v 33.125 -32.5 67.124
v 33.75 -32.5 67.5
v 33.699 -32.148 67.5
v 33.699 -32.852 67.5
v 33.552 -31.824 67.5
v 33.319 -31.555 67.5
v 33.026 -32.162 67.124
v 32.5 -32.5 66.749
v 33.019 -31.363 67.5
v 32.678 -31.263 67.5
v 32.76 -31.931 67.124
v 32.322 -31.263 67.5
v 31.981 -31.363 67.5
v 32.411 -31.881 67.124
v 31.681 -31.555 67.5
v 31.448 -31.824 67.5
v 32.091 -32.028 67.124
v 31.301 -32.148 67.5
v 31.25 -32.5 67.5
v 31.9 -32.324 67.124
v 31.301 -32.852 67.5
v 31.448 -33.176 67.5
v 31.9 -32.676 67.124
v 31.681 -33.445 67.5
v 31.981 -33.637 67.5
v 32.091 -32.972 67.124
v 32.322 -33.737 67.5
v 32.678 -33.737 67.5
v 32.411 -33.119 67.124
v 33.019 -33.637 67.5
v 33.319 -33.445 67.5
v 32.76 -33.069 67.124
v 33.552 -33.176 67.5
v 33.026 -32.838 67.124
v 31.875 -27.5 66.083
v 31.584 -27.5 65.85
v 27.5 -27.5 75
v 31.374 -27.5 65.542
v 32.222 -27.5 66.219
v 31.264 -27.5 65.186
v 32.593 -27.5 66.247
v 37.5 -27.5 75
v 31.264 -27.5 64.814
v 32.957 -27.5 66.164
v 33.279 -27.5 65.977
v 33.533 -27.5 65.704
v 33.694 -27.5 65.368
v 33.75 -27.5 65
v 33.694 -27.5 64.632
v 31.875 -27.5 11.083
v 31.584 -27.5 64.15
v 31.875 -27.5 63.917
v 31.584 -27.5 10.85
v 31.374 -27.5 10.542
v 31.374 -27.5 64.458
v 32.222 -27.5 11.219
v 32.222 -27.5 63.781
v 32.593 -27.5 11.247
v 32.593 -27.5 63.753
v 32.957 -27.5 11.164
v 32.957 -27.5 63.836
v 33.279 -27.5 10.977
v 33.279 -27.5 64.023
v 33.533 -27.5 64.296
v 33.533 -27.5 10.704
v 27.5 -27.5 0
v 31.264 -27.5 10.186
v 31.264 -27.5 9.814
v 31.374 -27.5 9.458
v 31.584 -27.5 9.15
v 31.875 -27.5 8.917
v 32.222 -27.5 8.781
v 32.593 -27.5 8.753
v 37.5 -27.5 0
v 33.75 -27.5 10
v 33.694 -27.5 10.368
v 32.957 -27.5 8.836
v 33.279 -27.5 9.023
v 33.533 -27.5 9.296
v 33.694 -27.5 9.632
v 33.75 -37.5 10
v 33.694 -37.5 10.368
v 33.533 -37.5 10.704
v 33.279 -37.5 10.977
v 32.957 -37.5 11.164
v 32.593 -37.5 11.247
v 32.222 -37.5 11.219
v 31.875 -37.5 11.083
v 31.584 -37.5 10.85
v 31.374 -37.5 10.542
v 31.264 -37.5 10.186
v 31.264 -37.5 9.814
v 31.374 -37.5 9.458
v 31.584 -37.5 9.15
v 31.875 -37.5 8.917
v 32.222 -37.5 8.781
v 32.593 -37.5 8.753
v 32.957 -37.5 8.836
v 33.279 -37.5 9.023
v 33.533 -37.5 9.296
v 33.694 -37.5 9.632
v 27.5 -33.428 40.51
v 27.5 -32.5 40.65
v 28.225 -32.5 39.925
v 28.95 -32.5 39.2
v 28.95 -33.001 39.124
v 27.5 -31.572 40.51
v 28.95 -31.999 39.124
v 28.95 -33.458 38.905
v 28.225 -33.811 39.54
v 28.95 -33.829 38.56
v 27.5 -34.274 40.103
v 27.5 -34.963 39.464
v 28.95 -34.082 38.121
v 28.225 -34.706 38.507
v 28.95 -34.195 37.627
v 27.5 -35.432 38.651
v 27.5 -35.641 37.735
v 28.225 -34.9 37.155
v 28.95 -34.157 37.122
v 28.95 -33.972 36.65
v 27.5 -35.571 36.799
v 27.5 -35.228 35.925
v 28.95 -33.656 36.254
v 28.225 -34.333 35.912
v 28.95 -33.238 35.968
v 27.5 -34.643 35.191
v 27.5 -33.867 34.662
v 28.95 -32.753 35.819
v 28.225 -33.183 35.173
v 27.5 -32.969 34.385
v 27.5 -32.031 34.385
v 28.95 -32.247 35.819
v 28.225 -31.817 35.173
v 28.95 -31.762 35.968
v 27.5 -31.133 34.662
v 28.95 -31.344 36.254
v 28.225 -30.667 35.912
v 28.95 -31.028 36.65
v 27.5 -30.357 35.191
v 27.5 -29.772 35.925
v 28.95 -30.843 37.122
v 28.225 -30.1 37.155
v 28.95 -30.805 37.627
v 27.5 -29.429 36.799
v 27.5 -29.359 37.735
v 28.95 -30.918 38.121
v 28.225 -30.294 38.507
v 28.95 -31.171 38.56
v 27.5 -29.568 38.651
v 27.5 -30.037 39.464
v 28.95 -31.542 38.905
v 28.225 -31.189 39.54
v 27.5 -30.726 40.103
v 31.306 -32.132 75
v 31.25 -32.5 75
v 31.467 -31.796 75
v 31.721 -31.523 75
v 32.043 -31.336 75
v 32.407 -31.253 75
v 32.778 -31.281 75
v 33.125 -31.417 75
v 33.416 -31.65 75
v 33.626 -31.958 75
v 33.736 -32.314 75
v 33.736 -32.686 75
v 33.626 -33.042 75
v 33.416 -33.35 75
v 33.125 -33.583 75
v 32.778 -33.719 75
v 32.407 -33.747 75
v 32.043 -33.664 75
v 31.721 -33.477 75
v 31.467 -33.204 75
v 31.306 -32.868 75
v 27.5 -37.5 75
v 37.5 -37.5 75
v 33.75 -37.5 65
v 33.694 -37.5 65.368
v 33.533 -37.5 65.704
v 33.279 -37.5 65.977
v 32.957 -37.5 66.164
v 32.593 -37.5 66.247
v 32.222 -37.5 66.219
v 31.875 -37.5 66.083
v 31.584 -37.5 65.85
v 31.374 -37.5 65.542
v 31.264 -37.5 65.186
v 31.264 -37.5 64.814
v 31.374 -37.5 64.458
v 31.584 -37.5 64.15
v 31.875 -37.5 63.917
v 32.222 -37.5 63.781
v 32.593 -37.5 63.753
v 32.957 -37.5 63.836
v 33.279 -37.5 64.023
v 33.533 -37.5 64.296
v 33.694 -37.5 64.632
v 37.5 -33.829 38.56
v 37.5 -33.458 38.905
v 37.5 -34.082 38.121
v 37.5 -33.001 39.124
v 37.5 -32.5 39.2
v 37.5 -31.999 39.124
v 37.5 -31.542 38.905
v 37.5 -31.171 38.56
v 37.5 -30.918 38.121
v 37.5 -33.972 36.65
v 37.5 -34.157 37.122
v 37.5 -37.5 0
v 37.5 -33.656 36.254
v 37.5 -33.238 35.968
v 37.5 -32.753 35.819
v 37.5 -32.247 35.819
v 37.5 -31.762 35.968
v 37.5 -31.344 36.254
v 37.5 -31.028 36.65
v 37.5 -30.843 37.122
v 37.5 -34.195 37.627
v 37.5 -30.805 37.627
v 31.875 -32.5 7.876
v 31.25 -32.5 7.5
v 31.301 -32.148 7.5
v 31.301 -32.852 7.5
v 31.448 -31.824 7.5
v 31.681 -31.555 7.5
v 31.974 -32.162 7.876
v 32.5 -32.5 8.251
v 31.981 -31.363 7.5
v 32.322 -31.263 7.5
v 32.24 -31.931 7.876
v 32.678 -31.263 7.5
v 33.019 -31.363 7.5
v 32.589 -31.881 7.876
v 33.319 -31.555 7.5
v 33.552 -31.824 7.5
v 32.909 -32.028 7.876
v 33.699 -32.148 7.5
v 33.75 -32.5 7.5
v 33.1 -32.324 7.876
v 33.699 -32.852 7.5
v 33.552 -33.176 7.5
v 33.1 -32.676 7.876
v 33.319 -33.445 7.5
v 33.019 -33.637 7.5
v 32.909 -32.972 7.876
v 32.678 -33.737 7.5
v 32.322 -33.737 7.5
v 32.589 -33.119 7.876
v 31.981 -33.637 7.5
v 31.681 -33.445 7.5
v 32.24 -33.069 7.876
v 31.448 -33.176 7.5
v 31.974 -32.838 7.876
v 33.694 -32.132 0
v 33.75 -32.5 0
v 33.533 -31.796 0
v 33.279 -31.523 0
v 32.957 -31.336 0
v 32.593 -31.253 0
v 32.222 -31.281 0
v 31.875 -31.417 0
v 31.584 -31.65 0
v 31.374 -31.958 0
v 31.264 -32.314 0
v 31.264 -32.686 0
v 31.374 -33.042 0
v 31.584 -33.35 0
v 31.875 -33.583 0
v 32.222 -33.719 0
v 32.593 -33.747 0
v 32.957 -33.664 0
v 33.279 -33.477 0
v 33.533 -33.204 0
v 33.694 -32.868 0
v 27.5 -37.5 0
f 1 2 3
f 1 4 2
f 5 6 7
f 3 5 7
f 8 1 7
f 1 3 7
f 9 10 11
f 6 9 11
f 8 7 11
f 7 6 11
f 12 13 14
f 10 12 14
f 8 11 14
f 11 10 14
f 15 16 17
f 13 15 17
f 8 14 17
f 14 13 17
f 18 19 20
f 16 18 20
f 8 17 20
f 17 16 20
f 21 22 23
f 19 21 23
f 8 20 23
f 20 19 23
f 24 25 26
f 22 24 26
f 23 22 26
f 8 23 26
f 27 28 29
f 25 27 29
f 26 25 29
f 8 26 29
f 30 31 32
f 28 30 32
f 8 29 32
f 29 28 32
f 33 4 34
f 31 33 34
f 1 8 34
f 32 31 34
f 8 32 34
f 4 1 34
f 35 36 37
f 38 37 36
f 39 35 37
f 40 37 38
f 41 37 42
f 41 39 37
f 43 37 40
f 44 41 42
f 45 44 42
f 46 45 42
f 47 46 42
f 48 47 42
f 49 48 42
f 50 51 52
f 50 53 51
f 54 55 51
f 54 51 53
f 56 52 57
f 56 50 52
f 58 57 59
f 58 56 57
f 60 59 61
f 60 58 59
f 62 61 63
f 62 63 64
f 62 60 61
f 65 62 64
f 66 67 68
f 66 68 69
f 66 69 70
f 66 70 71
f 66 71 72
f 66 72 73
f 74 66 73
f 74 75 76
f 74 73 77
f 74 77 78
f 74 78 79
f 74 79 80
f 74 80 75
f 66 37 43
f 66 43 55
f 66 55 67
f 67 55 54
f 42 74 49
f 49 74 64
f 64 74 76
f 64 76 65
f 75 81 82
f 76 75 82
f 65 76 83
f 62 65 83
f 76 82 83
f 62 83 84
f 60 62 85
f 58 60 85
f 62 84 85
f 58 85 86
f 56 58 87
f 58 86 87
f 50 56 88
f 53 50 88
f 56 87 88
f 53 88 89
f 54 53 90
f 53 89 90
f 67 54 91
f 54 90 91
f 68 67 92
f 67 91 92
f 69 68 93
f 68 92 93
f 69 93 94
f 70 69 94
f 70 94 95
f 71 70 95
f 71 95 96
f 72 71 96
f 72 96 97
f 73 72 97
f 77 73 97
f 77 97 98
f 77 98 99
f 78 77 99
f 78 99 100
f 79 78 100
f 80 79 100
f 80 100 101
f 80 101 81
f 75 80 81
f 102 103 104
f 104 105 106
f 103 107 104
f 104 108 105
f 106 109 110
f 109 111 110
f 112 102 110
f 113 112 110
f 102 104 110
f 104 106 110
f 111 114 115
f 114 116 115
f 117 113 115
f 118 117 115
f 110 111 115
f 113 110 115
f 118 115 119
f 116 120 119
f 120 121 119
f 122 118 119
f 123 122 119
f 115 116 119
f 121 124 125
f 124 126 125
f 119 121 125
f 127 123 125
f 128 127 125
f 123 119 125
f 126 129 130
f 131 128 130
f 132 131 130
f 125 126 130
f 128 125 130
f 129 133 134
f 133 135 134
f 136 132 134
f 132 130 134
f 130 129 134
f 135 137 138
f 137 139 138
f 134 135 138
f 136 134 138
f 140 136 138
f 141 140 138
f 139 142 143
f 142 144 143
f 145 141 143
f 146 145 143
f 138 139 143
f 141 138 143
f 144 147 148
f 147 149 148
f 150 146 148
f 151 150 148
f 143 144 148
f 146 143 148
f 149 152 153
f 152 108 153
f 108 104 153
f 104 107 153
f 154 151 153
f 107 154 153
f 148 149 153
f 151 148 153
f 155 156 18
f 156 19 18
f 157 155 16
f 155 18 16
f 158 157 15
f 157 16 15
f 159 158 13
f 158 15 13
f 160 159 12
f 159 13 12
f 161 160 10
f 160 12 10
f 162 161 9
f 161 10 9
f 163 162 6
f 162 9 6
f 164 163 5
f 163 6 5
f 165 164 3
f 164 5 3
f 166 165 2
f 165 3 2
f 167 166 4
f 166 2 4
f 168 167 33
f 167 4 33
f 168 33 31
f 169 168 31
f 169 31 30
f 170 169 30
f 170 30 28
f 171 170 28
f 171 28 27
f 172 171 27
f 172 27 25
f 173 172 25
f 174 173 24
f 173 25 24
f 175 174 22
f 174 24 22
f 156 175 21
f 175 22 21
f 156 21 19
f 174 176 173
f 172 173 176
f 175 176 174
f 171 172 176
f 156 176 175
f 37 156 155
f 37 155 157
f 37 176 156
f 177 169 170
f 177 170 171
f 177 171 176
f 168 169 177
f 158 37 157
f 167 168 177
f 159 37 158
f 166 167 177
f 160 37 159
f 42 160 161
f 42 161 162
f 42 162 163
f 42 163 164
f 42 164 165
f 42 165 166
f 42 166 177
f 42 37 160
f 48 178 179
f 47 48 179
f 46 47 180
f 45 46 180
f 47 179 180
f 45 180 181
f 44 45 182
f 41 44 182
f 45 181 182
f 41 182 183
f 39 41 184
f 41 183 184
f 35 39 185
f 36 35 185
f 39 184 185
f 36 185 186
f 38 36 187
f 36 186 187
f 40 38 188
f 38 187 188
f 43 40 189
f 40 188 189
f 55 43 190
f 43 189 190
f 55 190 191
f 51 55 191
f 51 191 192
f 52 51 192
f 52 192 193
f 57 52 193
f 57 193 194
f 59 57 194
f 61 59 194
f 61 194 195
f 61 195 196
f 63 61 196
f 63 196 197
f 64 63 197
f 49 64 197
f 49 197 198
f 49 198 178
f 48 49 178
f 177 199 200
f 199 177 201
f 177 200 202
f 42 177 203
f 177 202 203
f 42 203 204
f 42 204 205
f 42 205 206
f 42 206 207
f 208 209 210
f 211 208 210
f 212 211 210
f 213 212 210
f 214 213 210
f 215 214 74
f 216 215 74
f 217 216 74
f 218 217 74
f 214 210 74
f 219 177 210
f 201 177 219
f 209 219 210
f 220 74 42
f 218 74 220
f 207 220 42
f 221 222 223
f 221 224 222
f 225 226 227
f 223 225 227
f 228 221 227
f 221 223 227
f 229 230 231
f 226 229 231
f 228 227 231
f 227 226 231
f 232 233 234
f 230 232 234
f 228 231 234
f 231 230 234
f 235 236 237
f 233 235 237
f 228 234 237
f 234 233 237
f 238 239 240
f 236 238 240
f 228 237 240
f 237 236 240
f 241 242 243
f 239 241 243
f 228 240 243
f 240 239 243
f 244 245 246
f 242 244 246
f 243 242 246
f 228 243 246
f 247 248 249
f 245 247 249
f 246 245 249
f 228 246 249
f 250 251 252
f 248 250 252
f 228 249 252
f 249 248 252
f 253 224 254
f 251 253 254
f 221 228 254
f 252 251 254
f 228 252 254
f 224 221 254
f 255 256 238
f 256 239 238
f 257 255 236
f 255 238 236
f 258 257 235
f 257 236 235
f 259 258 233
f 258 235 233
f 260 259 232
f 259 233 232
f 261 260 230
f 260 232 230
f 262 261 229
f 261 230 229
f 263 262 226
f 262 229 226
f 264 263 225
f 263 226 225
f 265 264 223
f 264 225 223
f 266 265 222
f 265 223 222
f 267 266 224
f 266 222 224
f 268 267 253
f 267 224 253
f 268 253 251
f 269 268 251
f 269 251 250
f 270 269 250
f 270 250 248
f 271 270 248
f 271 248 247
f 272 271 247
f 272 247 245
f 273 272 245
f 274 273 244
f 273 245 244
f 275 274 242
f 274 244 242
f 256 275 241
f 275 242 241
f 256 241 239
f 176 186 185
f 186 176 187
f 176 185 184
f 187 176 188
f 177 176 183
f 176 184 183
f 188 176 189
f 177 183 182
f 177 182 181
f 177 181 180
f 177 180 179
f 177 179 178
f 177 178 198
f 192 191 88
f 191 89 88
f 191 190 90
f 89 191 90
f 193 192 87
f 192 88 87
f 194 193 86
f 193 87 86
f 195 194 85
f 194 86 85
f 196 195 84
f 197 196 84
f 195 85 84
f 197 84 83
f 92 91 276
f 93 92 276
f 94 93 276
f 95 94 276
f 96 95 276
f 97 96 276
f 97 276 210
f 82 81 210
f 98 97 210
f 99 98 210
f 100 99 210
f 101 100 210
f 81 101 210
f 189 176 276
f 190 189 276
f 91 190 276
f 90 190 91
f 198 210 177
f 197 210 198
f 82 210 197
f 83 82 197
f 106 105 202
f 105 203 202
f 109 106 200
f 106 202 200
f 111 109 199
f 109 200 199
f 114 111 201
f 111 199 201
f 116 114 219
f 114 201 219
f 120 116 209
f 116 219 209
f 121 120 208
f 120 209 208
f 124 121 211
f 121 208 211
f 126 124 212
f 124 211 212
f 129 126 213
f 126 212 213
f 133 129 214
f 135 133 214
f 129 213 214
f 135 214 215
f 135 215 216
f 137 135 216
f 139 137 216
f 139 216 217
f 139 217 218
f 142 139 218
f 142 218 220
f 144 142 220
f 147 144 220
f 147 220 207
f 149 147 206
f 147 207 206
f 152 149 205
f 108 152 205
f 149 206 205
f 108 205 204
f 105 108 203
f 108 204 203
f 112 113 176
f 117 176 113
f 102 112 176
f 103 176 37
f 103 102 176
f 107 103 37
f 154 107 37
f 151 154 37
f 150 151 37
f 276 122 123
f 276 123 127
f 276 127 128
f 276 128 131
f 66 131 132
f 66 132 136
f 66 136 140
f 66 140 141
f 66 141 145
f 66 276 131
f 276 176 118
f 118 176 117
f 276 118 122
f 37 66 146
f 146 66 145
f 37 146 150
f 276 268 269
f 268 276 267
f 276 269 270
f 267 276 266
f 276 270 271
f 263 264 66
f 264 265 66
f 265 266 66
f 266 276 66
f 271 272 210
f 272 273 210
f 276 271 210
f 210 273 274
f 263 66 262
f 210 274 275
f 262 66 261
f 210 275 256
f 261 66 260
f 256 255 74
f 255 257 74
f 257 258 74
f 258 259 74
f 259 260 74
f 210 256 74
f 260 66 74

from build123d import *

# Parameters (mm, degrees)
SKETCH1_W                                       = 10
SKETCH1_H                                       = 10
BOSS_EXTRUDE1_DEPTH                             = 75
M3X0_5_TAPPED_HOLE1_D                           = 2.5
M3X0_5_TAPPED_HOLE1_DEPTH                       = 7.5
M3X0_5_TAPPED_HOLE1_TIP                         = 0.751075774
M3X0_5_TAPPED_HOLE2_D                           = 2.5
M3X0_5_TAPPED_HOLE2_DEPTH                       = 7.5
M3X0_5_TAPPED_HOLE2_TIP                         = 0.751075774
CSK_FOR_M3_OVAL_HEAD_MACHINE_SCREW1_D           = 3.4
CSK_FOR_M3_OVAL_HEAD_MACHINE_SCREW1_CSINK_D     = 6.3
CSK_FOR_M3_OVAL_HEAD_MACHINE_SCREW1_CSINK_ANGLE = 90
M3X0_5_TAPPED_HOLE3_D                           = 2.5


with BuildPart() as part:
    # Sketch1 → Boss-Extrude1 (new body)
    with BuildSketch(Plane.XY):
        with Locations((32.5, -32.5)):
            Rectangle(SKETCH1_W, SKETCH1_H)
    extrude(amount=BOSS_EXTRUDE1_DEPTH)

    # M3x0.5 Tapped Hole1
    with Locations(Plane.XY.offset(75)):
        with Locations((32.5, -32.5)):
            Hole(M3X0_5_TAPPED_HOLE1_D / 2, depth=M3X0_5_TAPPED_HOLE1_DEPTH)
            with Locations((0, 0, -(M3X0_5_TAPPED_HOLE1_DEPTH + M3X0_5_TAPPED_HOLE1_TIP / 2))):  # 118° drill point
                Cone(0, M3X0_5_TAPPED_HOLE1_D / 2, M3X0_5_TAPPED_HOLE1_TIP, mode=Mode.SUBTRACT)

    # M3x0.5 Tapped Hole2
    with Locations(Plane(origin=(0, 0, 0), x_dir=(-1, 0, 0), z_dir=(0, 0, -1))):
        with Locations((-32.5, -32.5)):
            Hole(M3X0_5_TAPPED_HOLE2_D / 2, depth=M3X0_5_TAPPED_HOLE2_DEPTH)
            with Locations((0, 0, -(M3X0_5_TAPPED_HOLE2_DEPTH + M3X0_5_TAPPED_HOLE2_TIP / 2))):  # 118° drill point
                Cone(0, M3X0_5_TAPPED_HOLE2_D / 2, M3X0_5_TAPPED_HOLE2_TIP, mode=Mode.SUBTRACT)

    # CSK for M3 Oval Head Machine Screw1 (through all)
    with Locations(Plane(origin=(27.5, -32.5, 37.5), x_dir=(0, 0, -1), z_dir=(-1, 0, 0))):
        with Locations((0, 0)):
            CounterSinkHole(CSK_FOR_M3_OVAL_HEAD_MACHINE_SCREW1_D / 2, CSK_FOR_M3_OVAL_HEAD_MACHINE_SCREW1_CSINK_D / 2, counter_sink_angle=CSK_FOR_M3_OVAL_HEAD_MACHINE_SCREW1_CSINK_ANGLE)

    # M3x0.5 Tapped Hole3 (through all)
    with Locations(Plane(origin=(0, -27.5, 0), x_dir=(-1, 0, 0), z_dir=(0, 1, 0))):
        with Locations((-32.5, 65), (-32.5, 10)):
            Hole(M3X0_5_TAPPED_HOLE3_D / 2)


solid = part.part
